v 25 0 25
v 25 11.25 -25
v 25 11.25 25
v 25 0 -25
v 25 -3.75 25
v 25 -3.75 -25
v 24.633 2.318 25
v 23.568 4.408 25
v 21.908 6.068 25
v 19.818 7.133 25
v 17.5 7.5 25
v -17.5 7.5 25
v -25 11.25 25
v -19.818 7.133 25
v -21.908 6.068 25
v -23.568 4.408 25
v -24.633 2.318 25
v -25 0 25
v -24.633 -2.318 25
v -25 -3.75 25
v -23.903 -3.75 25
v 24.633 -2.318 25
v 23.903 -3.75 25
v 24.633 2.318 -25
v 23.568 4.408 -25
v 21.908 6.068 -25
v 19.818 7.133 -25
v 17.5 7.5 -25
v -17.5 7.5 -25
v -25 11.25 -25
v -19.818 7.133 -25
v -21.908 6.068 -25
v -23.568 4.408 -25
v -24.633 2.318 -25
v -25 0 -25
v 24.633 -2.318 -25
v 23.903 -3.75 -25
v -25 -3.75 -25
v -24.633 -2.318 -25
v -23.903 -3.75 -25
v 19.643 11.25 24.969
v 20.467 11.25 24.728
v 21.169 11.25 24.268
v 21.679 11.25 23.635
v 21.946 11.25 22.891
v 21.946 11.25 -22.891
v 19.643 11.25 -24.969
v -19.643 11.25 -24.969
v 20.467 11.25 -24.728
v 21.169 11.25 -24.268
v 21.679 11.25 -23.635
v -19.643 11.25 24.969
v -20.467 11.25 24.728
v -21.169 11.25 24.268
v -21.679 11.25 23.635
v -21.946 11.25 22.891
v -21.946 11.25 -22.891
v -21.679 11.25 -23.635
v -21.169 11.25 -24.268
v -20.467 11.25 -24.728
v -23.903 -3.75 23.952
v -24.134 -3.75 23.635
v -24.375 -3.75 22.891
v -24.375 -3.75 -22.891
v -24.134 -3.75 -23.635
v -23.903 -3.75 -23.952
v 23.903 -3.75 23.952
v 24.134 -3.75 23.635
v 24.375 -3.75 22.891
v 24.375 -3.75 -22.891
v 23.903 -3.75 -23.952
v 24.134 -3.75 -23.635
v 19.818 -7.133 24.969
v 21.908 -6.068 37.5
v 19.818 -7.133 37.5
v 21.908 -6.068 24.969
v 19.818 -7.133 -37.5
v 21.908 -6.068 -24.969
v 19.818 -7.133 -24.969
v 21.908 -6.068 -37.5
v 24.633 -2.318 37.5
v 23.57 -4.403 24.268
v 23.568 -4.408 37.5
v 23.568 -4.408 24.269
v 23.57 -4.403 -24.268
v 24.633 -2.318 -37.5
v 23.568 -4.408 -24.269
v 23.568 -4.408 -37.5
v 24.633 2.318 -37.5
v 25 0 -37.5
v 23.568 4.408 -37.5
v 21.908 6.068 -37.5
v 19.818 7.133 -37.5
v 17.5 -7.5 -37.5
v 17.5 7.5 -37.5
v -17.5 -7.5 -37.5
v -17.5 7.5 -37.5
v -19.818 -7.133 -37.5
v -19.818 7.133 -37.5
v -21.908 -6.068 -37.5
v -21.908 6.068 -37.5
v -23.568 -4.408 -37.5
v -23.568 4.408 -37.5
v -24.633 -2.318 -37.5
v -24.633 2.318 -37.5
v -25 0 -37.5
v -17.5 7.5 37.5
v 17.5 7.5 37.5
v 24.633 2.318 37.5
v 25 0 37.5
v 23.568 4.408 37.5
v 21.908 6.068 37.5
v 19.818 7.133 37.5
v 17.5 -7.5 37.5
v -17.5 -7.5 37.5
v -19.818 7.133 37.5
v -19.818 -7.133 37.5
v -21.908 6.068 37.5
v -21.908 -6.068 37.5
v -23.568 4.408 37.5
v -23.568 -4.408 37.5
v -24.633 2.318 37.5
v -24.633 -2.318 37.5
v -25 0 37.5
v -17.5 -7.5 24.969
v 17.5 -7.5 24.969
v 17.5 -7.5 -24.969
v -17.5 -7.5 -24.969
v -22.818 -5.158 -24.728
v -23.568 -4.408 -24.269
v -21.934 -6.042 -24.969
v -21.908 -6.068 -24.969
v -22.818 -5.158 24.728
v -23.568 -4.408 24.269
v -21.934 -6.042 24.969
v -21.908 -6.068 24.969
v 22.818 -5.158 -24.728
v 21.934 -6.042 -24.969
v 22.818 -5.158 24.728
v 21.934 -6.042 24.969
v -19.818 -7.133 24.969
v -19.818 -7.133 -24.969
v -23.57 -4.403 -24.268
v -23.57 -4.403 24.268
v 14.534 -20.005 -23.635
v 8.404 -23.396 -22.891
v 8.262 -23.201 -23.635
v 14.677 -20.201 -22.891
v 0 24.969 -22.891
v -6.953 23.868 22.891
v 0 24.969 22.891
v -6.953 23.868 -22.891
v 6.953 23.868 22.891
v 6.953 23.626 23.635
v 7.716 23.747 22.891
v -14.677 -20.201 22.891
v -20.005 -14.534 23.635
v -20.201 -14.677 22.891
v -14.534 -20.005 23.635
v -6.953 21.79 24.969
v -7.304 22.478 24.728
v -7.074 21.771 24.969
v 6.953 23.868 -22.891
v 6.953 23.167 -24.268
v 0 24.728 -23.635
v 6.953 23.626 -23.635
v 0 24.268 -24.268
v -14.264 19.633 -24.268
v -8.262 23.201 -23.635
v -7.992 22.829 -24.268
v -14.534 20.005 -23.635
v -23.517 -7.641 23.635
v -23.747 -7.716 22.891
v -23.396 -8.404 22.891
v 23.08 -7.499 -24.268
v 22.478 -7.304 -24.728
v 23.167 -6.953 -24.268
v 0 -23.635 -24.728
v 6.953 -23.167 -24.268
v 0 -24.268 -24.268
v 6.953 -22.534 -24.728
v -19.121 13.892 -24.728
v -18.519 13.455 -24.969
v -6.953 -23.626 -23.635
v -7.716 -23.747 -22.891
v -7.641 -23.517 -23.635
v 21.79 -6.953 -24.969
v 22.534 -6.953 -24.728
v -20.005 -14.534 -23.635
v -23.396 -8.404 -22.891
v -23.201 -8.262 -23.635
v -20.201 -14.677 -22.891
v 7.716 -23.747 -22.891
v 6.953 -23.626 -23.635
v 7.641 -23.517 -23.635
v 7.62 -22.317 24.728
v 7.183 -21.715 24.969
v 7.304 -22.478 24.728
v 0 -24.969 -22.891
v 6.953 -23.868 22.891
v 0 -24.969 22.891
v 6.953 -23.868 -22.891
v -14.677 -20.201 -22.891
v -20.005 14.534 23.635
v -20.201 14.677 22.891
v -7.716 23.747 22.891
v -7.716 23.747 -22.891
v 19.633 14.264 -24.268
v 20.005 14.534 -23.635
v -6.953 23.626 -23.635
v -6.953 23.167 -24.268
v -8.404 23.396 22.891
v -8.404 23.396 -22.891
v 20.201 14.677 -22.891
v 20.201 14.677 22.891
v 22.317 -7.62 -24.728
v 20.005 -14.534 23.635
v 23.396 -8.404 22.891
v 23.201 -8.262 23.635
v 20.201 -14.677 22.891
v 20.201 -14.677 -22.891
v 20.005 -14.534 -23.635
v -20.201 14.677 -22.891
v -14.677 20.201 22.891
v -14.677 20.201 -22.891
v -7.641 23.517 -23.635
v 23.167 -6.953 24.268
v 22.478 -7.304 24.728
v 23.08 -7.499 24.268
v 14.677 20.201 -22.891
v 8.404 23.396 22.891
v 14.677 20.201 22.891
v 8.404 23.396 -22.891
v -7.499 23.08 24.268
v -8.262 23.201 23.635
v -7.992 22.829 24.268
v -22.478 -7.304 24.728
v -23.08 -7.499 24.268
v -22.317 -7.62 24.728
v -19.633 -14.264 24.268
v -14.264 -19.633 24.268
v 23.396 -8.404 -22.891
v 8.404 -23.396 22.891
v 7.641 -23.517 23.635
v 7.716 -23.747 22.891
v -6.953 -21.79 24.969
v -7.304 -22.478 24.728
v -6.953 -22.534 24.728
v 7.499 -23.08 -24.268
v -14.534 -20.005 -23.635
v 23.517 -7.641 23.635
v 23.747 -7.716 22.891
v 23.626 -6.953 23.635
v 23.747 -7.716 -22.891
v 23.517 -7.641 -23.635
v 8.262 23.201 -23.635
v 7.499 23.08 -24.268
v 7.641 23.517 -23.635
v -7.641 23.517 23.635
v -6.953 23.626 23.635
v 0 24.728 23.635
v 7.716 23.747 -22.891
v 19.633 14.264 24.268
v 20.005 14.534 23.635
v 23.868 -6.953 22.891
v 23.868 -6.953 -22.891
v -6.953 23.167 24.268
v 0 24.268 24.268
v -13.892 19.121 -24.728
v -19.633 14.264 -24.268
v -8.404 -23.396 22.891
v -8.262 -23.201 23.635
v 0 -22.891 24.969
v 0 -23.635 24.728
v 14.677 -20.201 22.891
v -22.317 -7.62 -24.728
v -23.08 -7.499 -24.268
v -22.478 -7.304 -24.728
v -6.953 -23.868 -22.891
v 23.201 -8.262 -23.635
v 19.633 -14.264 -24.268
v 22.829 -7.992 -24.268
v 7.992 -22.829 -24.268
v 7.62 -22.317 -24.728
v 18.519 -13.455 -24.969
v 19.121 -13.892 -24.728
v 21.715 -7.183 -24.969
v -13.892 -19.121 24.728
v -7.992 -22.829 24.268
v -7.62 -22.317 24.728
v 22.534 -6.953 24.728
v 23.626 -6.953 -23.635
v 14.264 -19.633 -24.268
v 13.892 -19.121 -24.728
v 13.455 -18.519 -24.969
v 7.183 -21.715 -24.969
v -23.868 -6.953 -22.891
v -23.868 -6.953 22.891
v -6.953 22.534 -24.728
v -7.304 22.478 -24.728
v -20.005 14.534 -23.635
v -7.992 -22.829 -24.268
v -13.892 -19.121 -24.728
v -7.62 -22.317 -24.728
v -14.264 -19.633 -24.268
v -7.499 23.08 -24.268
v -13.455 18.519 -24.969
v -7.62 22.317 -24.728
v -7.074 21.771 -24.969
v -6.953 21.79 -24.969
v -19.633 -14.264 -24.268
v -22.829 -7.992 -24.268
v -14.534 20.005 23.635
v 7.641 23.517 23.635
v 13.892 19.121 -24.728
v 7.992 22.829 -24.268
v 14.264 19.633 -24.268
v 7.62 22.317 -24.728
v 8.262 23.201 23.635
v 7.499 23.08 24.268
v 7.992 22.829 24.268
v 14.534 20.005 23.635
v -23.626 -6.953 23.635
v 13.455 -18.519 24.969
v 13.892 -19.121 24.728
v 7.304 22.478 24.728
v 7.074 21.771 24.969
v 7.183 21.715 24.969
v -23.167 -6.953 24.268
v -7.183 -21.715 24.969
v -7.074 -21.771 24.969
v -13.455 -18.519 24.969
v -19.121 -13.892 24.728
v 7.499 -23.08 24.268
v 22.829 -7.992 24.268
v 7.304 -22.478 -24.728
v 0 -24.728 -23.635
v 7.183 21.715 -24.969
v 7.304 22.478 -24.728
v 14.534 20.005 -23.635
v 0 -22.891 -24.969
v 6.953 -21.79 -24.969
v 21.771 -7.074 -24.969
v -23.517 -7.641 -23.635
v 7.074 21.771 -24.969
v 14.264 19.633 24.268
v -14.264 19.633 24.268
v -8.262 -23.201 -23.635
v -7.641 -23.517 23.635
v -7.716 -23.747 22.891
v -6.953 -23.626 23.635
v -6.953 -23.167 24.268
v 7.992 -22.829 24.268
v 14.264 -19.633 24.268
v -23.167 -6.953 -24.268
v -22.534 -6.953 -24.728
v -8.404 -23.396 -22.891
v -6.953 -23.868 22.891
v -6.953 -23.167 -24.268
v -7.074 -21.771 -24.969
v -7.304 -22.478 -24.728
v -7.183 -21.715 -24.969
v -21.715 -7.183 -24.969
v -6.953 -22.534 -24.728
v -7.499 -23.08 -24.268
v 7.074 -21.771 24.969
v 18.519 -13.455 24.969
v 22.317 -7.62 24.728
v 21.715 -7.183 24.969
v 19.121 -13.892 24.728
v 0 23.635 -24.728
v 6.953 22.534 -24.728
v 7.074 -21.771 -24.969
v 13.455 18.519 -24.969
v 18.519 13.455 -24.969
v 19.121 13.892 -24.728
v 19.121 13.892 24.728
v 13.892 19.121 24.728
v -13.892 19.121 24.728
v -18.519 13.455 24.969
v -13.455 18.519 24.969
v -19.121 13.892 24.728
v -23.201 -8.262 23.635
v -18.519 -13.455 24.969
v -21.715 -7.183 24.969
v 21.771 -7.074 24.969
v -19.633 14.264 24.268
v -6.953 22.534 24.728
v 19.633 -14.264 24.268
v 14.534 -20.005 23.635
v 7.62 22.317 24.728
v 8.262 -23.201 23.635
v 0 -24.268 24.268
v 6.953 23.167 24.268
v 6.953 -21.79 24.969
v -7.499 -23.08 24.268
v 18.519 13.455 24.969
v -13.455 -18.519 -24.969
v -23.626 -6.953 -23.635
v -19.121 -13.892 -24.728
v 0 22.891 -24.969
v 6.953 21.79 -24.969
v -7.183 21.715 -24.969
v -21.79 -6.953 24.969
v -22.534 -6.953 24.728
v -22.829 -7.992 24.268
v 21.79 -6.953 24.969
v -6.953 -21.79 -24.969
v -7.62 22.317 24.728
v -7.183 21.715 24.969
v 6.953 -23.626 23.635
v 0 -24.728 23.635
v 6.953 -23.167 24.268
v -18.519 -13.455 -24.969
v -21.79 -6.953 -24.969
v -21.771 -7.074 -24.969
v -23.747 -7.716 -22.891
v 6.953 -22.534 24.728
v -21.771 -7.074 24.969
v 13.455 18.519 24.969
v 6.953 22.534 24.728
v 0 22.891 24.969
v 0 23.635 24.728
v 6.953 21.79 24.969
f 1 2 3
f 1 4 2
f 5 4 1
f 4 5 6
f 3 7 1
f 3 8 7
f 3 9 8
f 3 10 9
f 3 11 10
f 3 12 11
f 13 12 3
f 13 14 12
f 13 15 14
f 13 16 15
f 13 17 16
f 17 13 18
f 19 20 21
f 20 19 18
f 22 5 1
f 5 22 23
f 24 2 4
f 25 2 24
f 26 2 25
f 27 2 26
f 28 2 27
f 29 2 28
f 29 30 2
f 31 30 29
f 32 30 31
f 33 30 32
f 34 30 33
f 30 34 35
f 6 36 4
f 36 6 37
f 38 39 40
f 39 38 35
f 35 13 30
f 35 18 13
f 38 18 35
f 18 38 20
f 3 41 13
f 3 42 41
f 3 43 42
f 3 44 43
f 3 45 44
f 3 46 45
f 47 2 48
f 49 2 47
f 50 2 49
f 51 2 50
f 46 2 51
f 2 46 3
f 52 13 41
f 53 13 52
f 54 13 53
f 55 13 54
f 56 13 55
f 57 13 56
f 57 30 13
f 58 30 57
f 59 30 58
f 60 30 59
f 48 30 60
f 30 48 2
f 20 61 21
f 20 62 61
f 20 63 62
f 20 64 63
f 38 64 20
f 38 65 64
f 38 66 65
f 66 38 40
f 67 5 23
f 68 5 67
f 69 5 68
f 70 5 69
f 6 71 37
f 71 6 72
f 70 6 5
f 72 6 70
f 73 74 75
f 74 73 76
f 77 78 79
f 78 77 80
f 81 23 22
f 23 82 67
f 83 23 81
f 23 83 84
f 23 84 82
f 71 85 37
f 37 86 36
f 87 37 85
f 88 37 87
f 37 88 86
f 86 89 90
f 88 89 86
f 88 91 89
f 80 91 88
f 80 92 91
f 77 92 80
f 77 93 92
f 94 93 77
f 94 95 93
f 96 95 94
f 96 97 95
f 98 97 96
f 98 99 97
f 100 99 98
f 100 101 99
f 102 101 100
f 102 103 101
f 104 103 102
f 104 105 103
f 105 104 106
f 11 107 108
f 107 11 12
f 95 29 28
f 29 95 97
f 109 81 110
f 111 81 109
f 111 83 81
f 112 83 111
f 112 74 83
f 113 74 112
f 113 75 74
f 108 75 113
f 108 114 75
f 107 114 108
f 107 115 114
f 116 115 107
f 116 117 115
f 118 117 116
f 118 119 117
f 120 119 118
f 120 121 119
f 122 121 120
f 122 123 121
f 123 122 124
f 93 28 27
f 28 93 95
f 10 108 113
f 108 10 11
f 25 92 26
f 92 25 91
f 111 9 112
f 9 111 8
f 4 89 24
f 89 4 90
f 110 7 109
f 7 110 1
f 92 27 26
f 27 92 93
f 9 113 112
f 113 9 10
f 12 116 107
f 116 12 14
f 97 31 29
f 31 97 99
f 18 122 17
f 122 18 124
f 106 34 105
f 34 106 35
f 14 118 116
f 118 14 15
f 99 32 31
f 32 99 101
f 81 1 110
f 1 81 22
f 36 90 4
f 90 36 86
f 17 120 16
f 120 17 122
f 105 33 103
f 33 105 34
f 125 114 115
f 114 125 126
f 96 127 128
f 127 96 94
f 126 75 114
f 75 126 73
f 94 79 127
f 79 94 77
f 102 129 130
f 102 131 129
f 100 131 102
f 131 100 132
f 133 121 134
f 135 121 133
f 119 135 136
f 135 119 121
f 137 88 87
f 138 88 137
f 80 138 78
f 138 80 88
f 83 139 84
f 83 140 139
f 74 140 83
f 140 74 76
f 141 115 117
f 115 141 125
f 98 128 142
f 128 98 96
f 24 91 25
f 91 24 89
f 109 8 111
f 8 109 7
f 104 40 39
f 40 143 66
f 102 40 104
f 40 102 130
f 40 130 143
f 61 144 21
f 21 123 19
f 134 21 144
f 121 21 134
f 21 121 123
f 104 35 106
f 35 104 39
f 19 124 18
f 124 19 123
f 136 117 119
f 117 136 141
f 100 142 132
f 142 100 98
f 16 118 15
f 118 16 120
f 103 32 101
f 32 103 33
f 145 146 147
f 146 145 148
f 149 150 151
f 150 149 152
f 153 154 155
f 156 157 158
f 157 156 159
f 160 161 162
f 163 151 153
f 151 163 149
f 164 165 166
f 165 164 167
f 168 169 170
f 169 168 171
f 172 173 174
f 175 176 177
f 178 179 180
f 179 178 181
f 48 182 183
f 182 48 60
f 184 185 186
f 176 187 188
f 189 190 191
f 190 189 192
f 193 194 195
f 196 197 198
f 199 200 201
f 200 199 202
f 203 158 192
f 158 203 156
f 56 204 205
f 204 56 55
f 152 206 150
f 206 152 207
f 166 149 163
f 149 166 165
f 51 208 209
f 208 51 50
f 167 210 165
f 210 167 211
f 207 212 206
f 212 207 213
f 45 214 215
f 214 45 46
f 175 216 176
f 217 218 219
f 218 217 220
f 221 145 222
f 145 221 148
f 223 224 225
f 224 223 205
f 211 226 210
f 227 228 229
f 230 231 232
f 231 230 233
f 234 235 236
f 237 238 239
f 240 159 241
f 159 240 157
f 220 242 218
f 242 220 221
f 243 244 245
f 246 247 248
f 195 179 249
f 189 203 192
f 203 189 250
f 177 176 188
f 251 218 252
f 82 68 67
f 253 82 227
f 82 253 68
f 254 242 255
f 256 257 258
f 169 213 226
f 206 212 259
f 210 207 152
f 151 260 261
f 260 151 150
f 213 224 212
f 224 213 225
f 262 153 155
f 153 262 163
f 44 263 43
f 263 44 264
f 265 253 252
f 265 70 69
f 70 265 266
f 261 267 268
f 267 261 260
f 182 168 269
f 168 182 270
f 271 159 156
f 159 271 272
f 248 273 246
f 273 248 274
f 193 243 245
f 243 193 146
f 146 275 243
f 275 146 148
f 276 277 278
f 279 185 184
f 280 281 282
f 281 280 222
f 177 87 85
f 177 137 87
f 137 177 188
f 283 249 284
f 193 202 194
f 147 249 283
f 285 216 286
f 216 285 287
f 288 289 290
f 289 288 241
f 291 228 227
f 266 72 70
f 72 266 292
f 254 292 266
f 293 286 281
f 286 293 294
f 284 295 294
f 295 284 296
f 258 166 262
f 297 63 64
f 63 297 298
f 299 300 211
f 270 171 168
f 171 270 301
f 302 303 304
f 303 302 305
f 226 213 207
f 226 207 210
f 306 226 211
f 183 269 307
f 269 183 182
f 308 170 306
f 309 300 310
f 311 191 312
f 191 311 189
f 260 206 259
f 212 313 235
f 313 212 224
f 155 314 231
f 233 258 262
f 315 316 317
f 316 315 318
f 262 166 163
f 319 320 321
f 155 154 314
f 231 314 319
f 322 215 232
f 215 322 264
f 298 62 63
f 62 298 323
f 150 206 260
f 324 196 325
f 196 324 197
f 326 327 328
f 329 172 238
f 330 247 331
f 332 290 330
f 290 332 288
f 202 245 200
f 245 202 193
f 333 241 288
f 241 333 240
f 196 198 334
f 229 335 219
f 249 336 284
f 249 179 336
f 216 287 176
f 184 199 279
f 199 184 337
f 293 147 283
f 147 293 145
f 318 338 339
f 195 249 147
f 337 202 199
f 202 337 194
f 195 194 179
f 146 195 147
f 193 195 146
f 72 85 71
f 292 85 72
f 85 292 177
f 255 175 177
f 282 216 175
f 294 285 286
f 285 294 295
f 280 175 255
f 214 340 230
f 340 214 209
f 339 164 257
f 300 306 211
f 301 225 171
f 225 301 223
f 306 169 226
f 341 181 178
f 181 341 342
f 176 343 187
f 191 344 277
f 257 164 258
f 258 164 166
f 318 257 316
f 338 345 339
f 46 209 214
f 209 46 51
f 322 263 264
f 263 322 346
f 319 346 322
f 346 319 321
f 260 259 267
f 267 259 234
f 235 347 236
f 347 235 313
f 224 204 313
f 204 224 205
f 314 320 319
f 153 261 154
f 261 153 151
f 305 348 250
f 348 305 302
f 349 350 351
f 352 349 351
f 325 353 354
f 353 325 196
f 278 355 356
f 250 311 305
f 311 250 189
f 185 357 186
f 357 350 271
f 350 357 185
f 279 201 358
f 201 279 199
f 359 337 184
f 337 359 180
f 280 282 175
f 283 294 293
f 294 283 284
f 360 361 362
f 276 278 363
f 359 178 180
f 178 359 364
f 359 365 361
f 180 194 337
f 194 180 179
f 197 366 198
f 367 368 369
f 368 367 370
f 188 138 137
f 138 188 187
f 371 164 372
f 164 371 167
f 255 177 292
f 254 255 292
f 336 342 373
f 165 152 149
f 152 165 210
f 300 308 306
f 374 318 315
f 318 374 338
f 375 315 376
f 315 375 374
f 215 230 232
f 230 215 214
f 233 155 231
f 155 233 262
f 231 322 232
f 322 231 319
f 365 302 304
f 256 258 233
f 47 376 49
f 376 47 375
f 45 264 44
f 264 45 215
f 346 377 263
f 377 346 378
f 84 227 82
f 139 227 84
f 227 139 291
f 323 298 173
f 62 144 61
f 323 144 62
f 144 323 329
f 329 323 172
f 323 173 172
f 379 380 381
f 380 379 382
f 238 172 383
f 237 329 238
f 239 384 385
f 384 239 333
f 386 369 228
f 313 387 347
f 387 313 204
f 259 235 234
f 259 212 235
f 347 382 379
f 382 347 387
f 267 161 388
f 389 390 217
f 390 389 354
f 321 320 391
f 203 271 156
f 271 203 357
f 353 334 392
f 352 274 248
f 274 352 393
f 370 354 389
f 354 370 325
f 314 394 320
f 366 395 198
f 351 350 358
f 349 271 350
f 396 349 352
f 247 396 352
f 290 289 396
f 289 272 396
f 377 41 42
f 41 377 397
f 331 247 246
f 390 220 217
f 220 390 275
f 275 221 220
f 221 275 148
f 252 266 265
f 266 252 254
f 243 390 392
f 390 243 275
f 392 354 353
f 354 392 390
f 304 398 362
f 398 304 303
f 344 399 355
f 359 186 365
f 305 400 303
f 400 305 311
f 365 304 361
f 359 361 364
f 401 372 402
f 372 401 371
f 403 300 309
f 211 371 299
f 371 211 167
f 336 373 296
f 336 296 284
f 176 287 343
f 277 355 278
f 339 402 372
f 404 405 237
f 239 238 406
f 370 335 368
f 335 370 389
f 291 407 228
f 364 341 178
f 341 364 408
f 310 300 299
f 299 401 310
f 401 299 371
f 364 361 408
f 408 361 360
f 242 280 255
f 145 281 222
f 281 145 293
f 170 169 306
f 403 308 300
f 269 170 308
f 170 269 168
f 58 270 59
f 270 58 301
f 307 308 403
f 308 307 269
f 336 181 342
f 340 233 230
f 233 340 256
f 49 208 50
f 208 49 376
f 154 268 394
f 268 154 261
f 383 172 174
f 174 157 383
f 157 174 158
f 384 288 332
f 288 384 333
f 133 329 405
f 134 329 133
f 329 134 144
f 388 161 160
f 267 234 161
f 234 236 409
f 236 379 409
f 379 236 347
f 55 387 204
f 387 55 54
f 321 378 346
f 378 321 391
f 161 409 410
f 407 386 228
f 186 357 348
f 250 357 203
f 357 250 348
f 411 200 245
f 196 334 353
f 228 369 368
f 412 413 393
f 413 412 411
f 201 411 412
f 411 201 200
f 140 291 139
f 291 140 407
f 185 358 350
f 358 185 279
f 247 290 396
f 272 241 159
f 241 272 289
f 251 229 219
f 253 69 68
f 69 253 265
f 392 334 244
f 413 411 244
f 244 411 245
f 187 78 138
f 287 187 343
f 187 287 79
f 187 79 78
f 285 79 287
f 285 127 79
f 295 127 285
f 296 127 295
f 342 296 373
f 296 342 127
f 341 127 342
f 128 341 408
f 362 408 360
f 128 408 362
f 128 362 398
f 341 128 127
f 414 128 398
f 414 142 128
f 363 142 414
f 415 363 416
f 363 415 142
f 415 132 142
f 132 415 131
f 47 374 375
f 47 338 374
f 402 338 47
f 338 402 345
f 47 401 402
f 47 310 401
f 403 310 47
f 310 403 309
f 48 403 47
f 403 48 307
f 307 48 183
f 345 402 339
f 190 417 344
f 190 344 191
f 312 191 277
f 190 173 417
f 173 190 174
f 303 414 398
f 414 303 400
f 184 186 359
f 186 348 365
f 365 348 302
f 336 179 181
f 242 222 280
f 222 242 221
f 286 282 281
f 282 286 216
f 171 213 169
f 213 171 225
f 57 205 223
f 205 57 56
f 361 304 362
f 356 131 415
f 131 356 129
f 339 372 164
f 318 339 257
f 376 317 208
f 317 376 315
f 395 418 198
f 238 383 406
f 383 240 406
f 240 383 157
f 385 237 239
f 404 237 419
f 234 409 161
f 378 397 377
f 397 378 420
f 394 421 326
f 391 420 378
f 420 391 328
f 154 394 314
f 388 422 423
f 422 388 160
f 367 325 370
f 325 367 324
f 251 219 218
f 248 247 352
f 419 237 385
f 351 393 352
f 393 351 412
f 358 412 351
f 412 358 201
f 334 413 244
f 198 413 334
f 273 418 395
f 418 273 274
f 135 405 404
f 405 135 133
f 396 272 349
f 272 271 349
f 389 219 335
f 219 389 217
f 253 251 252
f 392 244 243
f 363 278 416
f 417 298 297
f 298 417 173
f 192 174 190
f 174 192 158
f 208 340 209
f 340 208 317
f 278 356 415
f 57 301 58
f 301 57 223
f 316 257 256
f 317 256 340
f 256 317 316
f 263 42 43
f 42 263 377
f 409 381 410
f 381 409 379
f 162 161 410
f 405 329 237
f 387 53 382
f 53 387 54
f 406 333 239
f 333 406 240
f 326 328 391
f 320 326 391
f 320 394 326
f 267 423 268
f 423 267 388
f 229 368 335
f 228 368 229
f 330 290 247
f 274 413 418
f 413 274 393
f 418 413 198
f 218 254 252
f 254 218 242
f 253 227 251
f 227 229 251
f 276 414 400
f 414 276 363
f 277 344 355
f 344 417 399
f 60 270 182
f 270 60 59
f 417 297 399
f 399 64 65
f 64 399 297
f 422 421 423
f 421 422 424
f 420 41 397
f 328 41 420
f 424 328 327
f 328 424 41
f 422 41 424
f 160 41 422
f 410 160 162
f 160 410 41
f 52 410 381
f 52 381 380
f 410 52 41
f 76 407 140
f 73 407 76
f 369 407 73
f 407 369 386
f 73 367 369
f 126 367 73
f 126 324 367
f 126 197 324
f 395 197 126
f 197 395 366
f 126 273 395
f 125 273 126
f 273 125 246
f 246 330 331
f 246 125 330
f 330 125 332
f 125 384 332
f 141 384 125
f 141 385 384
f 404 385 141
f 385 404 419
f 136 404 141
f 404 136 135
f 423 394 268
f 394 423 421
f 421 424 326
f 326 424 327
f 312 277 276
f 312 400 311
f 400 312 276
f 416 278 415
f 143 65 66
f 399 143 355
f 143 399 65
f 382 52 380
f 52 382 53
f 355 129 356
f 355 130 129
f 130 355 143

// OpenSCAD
roundcorner = true;
//roundcorner = false;


$fn = roundcorner ? 20 : 20;


roundcorner_size = roundcorner ? 5 : 0;

roller_main_shaft_length = 50;
roller_diameter = 50;

hanger_slot_span = 15;
hanger_slot_span_slop = 0.0;

hanger_slot_width = 10;
hanger_slot_width_slop = 0.0;

cap_crown_height = 5;
cap_funnel_height = 10;


// yardstick
//translate([0, hanger_slot_span / 2, 0]) color("purple") cube([roller_diameter, hanger_slot_span, roller_main_shaft_length + hanger_slot_width + cap_funnel_height + cap_crown_height], center = true);
translate([0, hanger_slot_span / 4, 0]) color("purple") cube([roller_diameter, hanger_slot_span, roller_main_shaft_length], center = true);


module spine () {
    // no minkowski on the spine
    hull () {
        translate([      (roller_diameter / 2) - (hanger_slot_span / 2), 0, 0] ) {
            cylinder(d = hanger_slot_span, h = roller_main_shaft_length + hanger_slot_width + cap_funnel_height + cap_crown_height, center = true);
        }
        translate([-1 * ((roller_diameter / 2) - (hanger_slot_span / 2)), 0, 0]) {
            cylinder(d = hanger_slot_span, h = roller_main_shaft_length + hanger_slot_width + cap_funnel_height + cap_crown_height, center = true);
        }
    }    
}

module torso () {
    if (roundcorner) {
        minkowski() {
            cylinder(d = roller_diameter - roundcorner_size, h = roller_main_shaft_length - roundcorner_size, center = true);
            sphere(d=roundcorner_size);
        }
    } else {
        cylinder(d = roller_diameter, h = roller_main_shaft_length, center = true);
    }
}

module cap () {
}

spine();
torso();
cap();

/*

module roller() {

    // main roller
    cylinder(h = roller_main_shaft_length, d = roller_diameter, center = true);


    // hanger_slot
    hull() {
        translate([0, 0, (roller_main_shaft_length / 2) + (hanger_slot_width / 2)]) {
            translate([(roller_diameter / 2) - (hanger_slot_width / 2), 0, 0]) {        
                cylinder(h = hanger_slot_span, d = hanger_slot_width, center = true);
            }
            translate([-((roller_diameter / 2) - (hanger_slot_width / 2)), 0, 0]) {
                cylinder(h = hanger_slot_span, d = hanger_slot_width, center = true);
            }
        }
    }

    // funnel
//    hull() {
        translate([0, 0, (roller_main_shaft_length / 2) + hanger_slot_width + (cap_funnel_height / 2)]) {
            translate([(roller_diameter / 2) - (hanger_slot_width / 2), 0, 0]) {        
                cylinder(h = hanger_slot_width, d = hanger_slot_span, center = true);
            }
            translate([-((roller_diameter / 2) - (hanger_slot_width / 2)), 0, 0]) {
                cylinder(h = hanger_slot_width, d = hanger_slot_span, center = true);
            }
          }

        translate([5, 0, (roller_main_shaft_length / 2) + hanger_slot_width + cap_funnel_height + (cap_crown_height / 2)]) {
              cylinder(h = cap_crown_height, d = roller_diameter, center = true);
          }
//      }
    
}


if (roundcorner) {
    minkowski() {
        roller();
        sphere(d=roundcorner_adjustment);
    }
} else {
    roller();
}
    





*/
